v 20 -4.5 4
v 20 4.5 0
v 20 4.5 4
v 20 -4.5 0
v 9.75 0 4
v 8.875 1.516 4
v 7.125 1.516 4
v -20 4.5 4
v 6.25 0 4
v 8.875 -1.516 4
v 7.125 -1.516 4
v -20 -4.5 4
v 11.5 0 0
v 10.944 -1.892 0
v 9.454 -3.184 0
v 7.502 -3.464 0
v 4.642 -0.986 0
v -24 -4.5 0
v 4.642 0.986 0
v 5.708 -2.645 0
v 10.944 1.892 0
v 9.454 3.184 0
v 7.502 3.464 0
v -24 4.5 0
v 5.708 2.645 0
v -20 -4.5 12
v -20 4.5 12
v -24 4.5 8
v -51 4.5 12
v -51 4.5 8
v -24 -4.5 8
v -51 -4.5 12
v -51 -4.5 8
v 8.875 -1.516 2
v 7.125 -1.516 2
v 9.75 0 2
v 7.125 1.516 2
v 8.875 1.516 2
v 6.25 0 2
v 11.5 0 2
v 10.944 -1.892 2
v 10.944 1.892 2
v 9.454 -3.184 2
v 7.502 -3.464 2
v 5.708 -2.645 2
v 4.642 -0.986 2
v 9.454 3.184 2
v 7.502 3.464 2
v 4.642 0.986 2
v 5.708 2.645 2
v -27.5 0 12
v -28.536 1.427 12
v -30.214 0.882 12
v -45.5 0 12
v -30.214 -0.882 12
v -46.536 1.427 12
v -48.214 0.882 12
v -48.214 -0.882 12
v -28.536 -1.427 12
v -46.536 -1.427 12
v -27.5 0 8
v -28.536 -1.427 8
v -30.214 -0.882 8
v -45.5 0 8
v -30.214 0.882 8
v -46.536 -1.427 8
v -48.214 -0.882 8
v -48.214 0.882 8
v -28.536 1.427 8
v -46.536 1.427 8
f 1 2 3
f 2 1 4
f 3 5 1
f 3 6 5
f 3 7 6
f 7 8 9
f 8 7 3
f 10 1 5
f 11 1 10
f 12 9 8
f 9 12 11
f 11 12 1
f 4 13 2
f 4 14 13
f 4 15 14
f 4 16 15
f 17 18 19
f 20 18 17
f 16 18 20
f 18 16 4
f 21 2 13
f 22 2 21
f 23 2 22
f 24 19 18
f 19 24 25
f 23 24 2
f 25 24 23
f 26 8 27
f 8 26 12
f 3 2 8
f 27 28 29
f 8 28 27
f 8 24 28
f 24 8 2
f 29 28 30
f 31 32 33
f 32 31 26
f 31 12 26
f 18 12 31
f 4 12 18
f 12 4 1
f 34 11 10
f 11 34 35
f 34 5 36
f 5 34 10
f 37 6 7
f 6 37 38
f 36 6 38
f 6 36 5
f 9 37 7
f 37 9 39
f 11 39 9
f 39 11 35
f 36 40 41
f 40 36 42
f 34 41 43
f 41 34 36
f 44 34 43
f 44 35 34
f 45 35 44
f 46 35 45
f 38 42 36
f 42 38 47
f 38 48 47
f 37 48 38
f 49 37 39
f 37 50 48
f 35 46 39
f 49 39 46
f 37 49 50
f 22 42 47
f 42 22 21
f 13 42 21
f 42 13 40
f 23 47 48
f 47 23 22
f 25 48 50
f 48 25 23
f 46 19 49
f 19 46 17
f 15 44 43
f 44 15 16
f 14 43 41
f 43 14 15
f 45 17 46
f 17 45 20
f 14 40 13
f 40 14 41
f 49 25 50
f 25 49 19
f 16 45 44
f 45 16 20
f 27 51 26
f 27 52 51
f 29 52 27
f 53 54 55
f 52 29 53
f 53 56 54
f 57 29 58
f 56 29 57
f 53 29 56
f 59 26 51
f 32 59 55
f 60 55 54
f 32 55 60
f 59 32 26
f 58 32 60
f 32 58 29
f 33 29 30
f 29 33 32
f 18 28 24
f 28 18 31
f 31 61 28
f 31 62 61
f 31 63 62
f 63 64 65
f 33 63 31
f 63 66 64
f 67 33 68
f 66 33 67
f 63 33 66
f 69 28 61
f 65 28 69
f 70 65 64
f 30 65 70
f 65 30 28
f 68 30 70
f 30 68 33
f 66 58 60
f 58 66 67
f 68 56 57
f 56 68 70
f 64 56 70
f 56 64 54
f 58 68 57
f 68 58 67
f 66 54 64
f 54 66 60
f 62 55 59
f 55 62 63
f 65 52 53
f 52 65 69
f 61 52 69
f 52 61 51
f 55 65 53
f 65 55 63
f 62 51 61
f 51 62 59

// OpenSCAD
3dtouch_holder ();

module 3dtouch_holder ()
{
    height = 4  ;
    length_a = 28;
    length = 40 ;
    width= 9 ;
    half_width  = width / 2;
    
    length_b = 27;
    diff = 18;
    hole = 3;
    
    difference() {
	translate ([-length/2.0, -width/2, 0]) {
    	    cube ([length, width, height]);
	}

    // bohrung (h, bottom_r, top_r)
    radius = 1.75;
    radius_head = 3.5;
    
    translate ([length_a - length/2,0,2]) {
    	   # cylinder (2, radius,radius);
	}
    translate ([length_a - length/2,0,0]) {
    	   # cylinder (2, radius_head,radius_head);
	}
    
}

    difference() {
	translate ([-length_b - length/2 - height, -width/2, 0]) {
    	    cube ([length_b + height, width, 3* height]);
	}
    
    
	translate ([-length_b - length/2 - height, -width/2, 0]) {
    	    #cube ([length_b, width, 2* height]);
	}
    
    translate ([-length_b - length/2, 0, 2*height]) {
    	   # cylinder (height, hole/2,hole/2);
	}
        
    translate ([-length_b - length/2 + diff, 0, 2*height]) {
    	   # cylinder (height, hole/2,hole/2);
	}
}
}
